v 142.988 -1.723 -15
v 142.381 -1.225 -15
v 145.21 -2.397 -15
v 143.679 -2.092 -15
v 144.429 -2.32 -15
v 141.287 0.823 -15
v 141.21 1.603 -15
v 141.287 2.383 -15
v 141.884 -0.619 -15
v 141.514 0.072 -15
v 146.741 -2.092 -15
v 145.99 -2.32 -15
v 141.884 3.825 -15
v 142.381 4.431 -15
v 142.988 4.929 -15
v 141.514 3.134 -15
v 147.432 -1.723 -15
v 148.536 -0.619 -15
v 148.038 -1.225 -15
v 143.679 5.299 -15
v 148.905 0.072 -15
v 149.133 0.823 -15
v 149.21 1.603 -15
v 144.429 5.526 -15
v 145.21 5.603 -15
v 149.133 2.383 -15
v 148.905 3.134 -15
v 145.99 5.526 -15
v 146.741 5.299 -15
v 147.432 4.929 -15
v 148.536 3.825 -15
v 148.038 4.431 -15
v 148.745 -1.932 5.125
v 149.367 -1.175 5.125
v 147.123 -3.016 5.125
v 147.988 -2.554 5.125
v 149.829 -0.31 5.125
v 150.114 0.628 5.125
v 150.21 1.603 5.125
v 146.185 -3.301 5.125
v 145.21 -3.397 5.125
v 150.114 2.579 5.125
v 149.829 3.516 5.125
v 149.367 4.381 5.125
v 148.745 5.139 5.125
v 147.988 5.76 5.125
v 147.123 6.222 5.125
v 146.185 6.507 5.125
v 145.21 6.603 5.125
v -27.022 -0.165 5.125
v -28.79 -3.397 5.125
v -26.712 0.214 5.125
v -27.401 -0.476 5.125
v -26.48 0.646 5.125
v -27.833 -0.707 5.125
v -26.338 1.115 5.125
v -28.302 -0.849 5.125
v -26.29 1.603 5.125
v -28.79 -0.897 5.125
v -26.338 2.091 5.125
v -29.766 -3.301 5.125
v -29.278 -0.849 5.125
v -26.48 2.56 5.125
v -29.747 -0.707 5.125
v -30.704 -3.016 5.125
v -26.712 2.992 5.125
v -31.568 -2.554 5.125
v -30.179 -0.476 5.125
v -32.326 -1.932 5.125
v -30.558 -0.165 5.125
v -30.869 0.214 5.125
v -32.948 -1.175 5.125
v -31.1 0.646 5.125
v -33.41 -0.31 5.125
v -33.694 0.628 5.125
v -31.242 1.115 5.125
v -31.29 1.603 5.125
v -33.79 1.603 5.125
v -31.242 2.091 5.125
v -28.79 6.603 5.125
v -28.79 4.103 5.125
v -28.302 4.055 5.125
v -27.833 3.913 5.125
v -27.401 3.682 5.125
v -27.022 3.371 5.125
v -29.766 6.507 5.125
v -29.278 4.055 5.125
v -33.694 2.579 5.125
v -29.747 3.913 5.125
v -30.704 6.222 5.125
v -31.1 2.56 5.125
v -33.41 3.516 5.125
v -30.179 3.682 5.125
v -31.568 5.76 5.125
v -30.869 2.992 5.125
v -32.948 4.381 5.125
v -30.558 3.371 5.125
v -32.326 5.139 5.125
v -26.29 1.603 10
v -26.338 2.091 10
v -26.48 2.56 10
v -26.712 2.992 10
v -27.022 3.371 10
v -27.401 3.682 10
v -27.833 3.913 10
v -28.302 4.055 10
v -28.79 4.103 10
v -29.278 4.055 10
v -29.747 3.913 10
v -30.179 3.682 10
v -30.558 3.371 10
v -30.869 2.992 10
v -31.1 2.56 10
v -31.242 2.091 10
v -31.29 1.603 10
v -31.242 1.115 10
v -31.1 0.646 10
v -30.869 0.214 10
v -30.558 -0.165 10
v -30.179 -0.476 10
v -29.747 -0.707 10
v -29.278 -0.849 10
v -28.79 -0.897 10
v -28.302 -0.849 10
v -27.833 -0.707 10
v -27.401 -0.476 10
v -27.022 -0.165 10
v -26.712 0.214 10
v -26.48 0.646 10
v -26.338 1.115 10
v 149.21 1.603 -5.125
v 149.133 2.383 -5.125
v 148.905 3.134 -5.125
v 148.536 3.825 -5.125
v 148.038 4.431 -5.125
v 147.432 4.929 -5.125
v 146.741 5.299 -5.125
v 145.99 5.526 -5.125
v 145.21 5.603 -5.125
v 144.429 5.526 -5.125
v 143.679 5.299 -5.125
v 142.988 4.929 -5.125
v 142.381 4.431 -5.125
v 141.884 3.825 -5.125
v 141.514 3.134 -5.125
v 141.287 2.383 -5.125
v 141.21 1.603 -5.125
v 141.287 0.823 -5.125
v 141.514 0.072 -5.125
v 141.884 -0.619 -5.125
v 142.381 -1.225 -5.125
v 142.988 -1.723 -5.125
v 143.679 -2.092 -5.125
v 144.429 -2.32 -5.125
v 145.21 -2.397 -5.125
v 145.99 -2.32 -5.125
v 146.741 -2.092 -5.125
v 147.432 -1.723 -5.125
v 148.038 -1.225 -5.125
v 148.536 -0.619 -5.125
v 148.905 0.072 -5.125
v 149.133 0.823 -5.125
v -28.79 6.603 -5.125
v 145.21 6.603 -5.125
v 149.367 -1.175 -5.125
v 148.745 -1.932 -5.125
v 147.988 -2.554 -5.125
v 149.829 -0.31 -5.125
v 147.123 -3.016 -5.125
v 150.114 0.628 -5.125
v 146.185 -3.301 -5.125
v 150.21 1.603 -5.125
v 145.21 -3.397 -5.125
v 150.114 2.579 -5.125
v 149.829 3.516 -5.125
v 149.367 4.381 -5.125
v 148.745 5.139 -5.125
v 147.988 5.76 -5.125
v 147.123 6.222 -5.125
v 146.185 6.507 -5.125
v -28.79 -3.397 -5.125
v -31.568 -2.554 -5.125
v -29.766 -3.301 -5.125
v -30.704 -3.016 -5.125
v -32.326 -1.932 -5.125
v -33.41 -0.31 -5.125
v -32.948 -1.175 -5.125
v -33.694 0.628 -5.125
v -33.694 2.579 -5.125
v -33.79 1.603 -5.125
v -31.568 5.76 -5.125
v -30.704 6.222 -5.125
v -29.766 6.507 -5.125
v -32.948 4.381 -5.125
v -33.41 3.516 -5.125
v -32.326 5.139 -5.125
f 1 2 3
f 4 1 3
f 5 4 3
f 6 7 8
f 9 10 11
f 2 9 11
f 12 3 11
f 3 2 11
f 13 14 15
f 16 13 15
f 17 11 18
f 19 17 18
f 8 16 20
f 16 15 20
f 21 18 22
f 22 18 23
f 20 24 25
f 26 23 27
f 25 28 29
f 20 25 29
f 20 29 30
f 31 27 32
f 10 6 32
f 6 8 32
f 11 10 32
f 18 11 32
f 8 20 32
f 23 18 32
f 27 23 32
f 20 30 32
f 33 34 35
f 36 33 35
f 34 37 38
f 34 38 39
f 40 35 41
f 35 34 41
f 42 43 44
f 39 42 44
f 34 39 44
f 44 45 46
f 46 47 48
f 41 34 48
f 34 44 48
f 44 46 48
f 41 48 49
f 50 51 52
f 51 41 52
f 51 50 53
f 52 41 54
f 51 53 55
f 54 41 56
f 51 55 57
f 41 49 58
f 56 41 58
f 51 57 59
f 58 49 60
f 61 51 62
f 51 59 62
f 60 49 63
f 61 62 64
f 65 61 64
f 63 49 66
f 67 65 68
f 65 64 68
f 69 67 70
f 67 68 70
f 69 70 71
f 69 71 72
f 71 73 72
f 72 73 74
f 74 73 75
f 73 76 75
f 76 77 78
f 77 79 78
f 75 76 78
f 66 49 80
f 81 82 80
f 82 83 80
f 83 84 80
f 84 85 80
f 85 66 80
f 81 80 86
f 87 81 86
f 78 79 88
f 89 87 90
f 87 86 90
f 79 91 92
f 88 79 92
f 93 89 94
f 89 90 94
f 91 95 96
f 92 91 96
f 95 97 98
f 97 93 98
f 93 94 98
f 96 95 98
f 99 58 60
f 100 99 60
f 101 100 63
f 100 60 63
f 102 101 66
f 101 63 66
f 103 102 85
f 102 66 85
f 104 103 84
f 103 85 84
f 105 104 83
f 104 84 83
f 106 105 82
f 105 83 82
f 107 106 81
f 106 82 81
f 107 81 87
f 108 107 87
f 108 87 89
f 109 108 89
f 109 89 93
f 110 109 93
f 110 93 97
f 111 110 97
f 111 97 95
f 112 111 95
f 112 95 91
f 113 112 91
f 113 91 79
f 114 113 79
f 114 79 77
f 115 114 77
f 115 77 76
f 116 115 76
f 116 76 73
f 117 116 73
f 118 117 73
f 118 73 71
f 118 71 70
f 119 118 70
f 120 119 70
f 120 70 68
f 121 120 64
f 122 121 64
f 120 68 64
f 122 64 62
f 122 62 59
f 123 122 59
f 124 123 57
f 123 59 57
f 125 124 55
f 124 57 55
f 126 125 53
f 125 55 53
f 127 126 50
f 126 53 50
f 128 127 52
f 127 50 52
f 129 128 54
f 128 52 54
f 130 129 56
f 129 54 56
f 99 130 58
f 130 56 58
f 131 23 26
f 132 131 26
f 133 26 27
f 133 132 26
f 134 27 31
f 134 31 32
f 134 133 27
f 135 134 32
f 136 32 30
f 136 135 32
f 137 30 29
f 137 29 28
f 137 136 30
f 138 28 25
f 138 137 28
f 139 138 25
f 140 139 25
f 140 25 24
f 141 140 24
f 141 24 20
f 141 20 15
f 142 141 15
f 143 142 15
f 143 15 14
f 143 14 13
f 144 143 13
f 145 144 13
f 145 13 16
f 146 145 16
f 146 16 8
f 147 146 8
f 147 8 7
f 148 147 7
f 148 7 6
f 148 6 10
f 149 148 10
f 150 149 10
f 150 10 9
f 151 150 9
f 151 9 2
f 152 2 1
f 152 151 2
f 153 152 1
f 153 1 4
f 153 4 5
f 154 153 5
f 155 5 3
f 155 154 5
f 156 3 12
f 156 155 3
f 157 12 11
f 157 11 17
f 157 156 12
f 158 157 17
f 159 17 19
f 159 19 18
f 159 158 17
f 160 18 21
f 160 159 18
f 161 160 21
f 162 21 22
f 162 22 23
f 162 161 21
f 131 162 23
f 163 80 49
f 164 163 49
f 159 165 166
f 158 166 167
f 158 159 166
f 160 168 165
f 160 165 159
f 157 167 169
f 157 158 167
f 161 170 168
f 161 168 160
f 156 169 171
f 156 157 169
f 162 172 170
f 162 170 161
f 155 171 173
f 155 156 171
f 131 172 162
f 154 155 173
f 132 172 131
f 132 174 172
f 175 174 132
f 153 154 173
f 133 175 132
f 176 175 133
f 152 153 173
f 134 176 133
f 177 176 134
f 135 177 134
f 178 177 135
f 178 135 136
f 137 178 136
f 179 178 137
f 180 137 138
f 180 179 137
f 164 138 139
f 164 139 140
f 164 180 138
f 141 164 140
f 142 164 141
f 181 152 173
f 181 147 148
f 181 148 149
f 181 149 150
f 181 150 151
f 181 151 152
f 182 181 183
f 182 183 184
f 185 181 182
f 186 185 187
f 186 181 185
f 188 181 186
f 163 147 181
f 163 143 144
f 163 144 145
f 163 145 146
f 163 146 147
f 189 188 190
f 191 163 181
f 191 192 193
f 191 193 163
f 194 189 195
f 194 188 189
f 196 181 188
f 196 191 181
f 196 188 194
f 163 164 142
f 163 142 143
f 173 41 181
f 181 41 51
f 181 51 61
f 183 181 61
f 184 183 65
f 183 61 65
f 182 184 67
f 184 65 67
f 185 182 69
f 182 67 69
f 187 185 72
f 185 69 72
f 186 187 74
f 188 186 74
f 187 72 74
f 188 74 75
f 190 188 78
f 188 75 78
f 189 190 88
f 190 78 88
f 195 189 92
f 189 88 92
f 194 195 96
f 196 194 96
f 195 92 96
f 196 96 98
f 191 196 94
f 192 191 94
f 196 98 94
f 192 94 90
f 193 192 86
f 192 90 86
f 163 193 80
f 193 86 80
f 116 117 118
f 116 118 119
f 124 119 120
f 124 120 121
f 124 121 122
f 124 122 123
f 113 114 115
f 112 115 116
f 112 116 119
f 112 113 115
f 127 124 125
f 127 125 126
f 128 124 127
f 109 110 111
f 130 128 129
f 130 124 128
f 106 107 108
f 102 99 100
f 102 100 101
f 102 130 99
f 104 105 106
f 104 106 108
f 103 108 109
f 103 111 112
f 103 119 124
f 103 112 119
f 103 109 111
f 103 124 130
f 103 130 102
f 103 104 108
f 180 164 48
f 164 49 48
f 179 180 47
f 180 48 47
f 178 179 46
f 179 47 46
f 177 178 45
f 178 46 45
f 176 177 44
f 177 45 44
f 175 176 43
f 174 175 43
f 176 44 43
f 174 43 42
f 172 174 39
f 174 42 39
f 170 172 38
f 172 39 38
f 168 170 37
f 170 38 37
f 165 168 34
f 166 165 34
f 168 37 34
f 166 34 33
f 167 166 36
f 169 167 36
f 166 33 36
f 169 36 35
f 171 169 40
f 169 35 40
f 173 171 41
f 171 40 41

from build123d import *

# Parameters (mm, degrees)
BOSS_EXTRU_1_DEPTH = 5.125
ESQUISSE2_R        = 2.5
BOSS_EXTRU_2_DEPTH = 10
ESQUISSE3_R        = 4
BOSS_EXTRU_3_DEPTH = 15


with BuildPart() as part:
    # Esquisse1 → Boss.-Extru.1 (new, symmetric)
    with BuildSketch(Plane.XY):
        with BuildLine():
            Line((-28.790189362, 6.603053435), (145.209810638, 6.603053435))
            ThreePointArc((145.209810638, 6.603053435), (150.209810638, 1.603053435), (145.209810638, -3.396946565))
            Line((145.209810638, -3.396946565), (-28.790189362, -3.396946565))
            ThreePointArc((-28.790189362, -3.396946565), (-33.790189362, 1.603053435), (-28.790189362, 6.603053435))
        make_face()
    extrude(amount=BOSS_EXTRU_1_DEPTH, both=True)

    # Esquisse2 → Boss.-Extru.2 (add)
    with BuildSketch(Plane.XY):
        with Locations((-28.790189362, 1.603053435)):
            Circle(ESQUISSE2_R)
    extrude(amount=BOSS_EXTRU_2_DEPTH)

    # Esquisse3 → Boss.-Extru.3 (add)
    with BuildSketch(Plane.XY):
        with Locations((145.209810638, 1.603053435)):
            Circle(ESQUISSE3_R)
    extrude(amount=-BOSS_EXTRU_3_DEPTH)


solid = part.part
